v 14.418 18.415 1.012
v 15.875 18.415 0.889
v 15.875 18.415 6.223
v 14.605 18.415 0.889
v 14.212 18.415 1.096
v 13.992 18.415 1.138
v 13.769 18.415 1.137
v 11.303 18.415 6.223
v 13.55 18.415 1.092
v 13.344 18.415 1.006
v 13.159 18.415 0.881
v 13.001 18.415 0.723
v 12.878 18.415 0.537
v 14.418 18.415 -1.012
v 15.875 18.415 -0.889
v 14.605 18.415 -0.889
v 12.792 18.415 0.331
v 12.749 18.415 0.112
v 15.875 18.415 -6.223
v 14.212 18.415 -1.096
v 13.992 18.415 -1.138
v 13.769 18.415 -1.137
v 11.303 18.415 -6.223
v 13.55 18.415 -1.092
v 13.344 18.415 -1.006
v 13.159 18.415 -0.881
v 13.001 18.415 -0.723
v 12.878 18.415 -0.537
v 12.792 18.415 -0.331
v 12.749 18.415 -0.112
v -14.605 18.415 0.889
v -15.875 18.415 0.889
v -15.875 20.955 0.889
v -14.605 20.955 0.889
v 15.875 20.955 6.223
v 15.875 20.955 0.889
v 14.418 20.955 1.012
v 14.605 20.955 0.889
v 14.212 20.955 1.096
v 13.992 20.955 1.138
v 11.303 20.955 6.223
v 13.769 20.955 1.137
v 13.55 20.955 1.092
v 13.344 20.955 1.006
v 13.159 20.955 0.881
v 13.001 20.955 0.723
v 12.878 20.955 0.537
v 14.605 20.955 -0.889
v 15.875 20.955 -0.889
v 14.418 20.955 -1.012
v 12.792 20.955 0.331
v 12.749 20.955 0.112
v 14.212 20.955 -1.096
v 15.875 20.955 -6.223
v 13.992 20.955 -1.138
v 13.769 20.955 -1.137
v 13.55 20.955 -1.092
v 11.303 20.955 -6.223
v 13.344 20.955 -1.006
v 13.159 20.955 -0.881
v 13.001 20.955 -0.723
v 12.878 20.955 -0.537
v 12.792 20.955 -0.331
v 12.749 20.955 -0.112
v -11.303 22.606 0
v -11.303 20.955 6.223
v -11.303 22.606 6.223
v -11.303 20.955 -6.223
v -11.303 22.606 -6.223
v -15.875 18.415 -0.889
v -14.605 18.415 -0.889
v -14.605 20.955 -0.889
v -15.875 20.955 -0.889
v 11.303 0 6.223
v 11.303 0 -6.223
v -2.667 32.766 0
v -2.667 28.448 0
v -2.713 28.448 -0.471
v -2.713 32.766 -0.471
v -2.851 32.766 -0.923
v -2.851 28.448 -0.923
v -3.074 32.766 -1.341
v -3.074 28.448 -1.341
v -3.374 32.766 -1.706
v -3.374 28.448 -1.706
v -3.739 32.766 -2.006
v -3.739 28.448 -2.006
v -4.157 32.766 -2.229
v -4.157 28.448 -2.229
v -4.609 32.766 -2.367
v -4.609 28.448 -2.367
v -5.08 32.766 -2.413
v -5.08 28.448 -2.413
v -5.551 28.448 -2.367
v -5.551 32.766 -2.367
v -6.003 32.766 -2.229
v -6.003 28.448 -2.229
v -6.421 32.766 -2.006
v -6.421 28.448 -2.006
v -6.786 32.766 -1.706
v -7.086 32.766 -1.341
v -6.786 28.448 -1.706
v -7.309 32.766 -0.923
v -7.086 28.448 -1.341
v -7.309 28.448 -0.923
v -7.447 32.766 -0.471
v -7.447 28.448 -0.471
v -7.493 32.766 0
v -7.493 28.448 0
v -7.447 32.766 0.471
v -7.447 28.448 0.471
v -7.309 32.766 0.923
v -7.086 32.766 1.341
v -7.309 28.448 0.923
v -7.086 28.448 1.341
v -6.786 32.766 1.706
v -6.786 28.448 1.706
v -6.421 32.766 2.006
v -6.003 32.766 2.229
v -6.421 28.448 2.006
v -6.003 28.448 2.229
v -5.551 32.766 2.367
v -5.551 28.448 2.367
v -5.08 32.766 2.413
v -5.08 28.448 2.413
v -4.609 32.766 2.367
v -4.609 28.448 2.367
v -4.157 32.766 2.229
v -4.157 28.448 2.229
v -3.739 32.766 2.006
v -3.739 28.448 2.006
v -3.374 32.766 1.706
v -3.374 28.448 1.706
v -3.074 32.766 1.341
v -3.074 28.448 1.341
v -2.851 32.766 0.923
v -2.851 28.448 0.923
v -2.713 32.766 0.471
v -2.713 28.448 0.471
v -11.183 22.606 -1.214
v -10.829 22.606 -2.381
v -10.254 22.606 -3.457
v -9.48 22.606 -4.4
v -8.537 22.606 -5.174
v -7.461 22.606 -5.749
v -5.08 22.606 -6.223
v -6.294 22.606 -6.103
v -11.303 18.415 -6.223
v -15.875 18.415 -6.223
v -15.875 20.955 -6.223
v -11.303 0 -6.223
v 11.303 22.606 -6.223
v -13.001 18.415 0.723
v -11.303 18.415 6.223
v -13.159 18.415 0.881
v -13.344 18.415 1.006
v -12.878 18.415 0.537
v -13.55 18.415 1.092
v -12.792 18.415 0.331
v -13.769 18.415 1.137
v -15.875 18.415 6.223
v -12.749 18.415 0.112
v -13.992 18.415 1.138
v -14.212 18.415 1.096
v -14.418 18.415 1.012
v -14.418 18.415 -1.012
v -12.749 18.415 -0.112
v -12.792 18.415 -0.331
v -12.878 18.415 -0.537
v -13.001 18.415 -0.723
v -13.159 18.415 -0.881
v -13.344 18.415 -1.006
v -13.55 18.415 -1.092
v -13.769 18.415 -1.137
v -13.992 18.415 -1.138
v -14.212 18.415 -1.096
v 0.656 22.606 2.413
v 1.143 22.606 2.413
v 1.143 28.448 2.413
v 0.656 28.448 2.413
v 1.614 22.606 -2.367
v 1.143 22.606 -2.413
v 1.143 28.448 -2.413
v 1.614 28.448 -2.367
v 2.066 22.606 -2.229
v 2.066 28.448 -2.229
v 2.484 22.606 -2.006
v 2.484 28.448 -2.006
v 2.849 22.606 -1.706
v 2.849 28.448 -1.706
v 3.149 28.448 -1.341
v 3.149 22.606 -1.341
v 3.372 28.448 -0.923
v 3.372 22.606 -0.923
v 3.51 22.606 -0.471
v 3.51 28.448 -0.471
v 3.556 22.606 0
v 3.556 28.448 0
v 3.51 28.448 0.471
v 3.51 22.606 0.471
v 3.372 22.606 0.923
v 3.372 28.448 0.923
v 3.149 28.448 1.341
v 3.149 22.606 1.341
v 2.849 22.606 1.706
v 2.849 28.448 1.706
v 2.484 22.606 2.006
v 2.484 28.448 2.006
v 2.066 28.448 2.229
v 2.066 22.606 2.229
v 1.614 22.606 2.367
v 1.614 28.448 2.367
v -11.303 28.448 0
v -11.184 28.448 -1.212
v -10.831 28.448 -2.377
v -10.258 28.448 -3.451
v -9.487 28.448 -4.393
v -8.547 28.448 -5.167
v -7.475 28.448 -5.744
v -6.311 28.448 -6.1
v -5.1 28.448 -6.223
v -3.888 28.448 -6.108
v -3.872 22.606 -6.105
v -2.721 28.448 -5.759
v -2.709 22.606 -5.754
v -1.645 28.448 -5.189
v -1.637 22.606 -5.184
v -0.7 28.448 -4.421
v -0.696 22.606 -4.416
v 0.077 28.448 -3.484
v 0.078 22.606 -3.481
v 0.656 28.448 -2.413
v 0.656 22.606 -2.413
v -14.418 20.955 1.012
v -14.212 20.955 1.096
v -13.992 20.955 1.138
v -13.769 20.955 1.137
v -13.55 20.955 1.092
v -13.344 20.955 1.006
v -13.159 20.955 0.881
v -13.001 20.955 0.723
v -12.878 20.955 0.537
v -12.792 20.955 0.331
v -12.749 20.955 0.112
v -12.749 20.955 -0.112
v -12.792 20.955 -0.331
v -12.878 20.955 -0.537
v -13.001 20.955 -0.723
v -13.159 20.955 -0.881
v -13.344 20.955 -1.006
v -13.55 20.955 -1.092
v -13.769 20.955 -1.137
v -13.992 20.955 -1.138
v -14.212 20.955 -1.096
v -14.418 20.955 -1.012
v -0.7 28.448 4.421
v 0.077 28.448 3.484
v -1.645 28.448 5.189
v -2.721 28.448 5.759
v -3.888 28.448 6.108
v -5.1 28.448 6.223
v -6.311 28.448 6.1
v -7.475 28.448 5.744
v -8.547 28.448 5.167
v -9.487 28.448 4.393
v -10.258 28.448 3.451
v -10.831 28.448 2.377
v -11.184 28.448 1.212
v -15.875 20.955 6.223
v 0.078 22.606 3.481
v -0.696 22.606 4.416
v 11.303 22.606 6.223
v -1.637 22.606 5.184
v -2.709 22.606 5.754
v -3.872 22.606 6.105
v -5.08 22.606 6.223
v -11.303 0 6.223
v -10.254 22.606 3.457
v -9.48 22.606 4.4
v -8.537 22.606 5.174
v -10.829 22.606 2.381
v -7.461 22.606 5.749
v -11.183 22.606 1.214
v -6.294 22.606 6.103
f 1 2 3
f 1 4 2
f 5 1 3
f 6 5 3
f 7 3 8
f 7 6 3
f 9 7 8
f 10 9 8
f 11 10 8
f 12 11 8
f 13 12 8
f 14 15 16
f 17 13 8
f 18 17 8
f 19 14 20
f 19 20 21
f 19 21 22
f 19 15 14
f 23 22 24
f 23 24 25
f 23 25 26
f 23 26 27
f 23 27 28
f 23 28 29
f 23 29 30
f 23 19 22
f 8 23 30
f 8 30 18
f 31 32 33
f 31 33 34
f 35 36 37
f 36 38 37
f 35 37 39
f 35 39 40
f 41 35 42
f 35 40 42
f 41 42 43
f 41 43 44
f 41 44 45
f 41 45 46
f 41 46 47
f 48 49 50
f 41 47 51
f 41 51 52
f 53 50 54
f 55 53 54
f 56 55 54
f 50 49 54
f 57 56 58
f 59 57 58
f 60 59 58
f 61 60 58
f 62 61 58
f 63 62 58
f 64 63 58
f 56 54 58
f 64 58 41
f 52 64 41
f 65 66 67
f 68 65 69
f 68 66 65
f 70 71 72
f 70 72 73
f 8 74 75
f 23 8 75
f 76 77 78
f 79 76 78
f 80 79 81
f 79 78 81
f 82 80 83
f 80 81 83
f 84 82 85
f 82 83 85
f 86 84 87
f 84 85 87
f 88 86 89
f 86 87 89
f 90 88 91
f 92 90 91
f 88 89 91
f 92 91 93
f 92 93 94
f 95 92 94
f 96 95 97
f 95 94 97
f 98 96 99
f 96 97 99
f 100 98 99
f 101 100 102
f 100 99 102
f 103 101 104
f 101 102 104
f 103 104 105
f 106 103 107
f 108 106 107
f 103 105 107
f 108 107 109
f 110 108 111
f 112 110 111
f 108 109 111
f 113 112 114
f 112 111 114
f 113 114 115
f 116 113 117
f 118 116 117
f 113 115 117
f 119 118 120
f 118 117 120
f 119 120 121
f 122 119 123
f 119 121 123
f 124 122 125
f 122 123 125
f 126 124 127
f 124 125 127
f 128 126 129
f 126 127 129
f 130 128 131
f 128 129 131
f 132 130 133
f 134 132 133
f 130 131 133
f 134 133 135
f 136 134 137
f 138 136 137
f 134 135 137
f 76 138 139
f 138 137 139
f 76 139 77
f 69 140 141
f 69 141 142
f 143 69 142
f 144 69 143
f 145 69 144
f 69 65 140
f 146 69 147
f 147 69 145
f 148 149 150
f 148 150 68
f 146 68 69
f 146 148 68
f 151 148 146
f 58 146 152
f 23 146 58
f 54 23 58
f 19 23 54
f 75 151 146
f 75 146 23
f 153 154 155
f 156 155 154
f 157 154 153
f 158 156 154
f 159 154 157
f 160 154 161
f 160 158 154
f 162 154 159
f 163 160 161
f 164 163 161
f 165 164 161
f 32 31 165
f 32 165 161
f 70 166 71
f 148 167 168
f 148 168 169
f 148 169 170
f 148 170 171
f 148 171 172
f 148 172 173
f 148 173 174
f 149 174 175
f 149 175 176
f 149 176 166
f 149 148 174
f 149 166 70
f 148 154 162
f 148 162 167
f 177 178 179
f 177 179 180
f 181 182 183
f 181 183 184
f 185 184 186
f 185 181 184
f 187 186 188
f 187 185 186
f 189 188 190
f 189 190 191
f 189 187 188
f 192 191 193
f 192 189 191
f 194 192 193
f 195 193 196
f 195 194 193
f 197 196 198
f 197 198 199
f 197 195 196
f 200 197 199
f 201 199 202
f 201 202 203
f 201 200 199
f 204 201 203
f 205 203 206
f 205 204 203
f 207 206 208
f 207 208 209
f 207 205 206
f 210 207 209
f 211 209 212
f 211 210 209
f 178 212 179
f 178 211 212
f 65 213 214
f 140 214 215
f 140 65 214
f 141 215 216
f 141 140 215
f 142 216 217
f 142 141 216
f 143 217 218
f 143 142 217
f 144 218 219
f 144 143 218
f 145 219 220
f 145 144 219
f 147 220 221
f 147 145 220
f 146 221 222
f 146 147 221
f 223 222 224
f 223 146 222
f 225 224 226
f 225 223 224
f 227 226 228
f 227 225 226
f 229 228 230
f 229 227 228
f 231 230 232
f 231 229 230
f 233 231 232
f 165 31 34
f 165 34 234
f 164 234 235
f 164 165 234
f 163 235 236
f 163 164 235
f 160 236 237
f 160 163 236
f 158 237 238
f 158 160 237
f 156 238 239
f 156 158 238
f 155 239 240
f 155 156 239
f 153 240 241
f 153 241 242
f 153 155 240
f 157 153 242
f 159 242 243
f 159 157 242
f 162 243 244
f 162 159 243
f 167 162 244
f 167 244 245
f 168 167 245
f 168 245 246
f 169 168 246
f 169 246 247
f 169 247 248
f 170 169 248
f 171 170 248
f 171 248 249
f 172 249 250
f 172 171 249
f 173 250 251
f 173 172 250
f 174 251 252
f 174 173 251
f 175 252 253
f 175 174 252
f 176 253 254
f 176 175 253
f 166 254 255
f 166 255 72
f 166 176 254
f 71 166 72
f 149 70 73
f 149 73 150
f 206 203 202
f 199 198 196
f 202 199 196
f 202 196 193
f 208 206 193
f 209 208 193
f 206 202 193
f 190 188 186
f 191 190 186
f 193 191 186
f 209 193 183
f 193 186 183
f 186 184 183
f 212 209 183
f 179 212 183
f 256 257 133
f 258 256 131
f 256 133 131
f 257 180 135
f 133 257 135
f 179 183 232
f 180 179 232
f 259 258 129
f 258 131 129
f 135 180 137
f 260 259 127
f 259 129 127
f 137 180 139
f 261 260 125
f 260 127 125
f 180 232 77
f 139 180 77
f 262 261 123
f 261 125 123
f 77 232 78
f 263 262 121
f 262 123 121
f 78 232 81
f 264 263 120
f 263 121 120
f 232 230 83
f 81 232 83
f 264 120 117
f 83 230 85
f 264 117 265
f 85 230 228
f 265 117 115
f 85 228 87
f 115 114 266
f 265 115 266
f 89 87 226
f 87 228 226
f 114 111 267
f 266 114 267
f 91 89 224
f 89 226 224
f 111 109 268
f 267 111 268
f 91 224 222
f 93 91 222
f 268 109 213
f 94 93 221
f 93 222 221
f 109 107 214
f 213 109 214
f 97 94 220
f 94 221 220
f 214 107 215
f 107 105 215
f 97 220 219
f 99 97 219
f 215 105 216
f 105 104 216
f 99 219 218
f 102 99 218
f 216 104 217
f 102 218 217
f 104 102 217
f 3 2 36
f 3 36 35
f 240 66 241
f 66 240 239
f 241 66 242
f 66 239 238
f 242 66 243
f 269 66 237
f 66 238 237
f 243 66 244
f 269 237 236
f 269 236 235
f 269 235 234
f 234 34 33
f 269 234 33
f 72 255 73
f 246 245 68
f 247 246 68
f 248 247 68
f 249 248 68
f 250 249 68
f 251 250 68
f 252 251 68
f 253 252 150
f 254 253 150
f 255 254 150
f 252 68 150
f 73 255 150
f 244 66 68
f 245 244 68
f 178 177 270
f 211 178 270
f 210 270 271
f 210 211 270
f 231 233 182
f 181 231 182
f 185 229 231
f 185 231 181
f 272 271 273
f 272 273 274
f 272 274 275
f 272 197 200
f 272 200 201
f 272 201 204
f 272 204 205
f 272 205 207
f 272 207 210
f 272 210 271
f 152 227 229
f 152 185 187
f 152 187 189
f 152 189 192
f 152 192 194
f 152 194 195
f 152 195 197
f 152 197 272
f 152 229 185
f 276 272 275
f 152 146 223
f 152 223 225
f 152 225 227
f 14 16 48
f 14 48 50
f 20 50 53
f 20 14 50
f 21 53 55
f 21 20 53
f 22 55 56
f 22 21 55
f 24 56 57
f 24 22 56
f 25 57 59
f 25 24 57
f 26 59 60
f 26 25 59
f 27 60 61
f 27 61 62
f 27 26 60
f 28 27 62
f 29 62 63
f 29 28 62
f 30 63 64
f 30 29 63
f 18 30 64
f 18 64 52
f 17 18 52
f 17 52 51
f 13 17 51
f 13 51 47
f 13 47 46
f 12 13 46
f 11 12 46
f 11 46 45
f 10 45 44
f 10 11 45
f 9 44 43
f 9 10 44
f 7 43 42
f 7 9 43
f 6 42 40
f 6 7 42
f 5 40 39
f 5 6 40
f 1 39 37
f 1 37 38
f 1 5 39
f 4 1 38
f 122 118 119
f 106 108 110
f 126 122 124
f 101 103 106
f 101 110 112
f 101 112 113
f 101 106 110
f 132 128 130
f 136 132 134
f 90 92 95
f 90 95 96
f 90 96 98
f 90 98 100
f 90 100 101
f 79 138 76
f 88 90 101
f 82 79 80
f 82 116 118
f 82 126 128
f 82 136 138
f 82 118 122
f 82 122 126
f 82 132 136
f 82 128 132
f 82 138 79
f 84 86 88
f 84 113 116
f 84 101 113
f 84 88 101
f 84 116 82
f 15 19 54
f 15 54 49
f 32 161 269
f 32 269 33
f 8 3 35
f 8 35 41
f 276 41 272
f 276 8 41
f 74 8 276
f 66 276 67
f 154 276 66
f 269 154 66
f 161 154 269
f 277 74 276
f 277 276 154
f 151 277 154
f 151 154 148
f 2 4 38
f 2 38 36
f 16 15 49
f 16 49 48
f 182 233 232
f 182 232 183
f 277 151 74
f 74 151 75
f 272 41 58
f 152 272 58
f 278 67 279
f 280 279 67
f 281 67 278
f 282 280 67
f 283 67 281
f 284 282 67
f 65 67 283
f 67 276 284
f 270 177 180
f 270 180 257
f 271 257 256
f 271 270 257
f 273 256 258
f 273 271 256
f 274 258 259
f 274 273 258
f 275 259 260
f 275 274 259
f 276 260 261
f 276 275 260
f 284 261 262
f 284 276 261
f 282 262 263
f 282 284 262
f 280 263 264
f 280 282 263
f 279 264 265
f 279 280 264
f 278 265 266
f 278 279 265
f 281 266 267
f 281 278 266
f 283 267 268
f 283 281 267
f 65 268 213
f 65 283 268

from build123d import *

# Parameters (mm, degrees)
SKETCH1_W           = 22.606
SKETCH1_H           = 12.446
BOSS_EXTRUDE1_DEPTH = 18.415
BOSS_EXTRUDE2_DEPTH = 2.54
SKETCH3_W           = 22.606
SKETCH3_H           = 12.446
BOSS_EXTRUDE3_DEPTH = 1.651
BOSS_EXTRUDE4_DEPTH = 5.842
SKETCH5_R           = 2.413
BOSS_EXTRUDE5_DEPTH = 4.318


with BuildPart() as part:
    # Sketch1 → Boss-Extrude1 (new body)
    with BuildSketch(Plane(origin=(0, 0, 0), x_dir=(1, 0, 0), z_dir=(0, 1, 0))):
        Rectangle(SKETCH1_W, SKETCH1_H)
    extrude(amount=BOSS_EXTRUDE1_DEPTH)

    # Sketch2 → Boss-Extrude2 (add)
    with BuildSketch(Plane(origin=(0, 18.415, 0), x_dir=(1, 0, 0), z_dir=(0, 1, 0))):
        with BuildLine():
            Line((15.875, -6.223), (-15.875, -6.223))
            Line((-15.875, -6.223), (-15.875, -0.889))
            Line((-15.875, -0.889), (-14.605, -0.889))
            ThreePointArc((-14.605, -0.889), (-12.74357951, 0), (-14.605, 0.889))
            Line((-14.605, 0.889), (-15.875, 0.889))
            Line((-15.875, 0.889), (-15.875, 6.223))
            Line((-15.875, 6.223), (15.875, 6.223))
            Line((15.875, 6.223), (15.875, 0.889))
            Line((15.875, 0.889), (14.605, 0.889))
            ThreePointArc((14.605, 0.889), (12.74357951, 0), (14.605, -0.889))
            Line((14.605, -0.889), (15.875, -0.889))
            Line((15.875, -0.889), (15.875, -6.223))
        make_face()
    extrude(amount=BOSS_EXTRUDE2_DEPTH)

    # Sketch3 → Boss-Extrude3 (add)
    with BuildSketch(Plane(origin=(0, 20.955, 0), x_dir=(1, 0, 0), z_dir=(0, 1, 0))):
        Rectangle(SKETCH3_W, SKETCH3_H)
    extrude(amount=BOSS_EXTRUDE3_DEPTH)

    # Sketch4 → Boss-Extrude4 (add)
    with BuildSketch(Plane(origin=(0, 22.606, 0), x_dir=(1, 0, 0), z_dir=(0, 1, 0))):
        with BuildLine():
            ThreePointArc((0.656127614, -2.413), (-6.310814133, -6.100067669), (-11.303, 0))
            ThreePointArc((-11.303, 0), (-6.310814133, 6.100067669), (0.656127614, 2.413))
            Line((0.656127614, 2.413), (1.143, 2.413))
            ThreePointArc((1.143, 2.413), (3.556, 0), (1.143, -2.413))
            Line((1.143, -2.413), (0.656127614, -2.413))
        make_face()
    extrude(amount=BOSS_EXTRUDE4_DEPTH)

    # Sketch5 → Boss-Extrude5 (add)
    with BuildSketch(Plane(origin=(0, 28.448, 0), x_dir=(1, 0, 0), z_dir=(0, 1, 0))):
        with Locations((-5.08, 0)):
            Circle(SKETCH5_R)
    extrude(amount=BOSS_EXTRUDE5_DEPTH)


solid = part.part
